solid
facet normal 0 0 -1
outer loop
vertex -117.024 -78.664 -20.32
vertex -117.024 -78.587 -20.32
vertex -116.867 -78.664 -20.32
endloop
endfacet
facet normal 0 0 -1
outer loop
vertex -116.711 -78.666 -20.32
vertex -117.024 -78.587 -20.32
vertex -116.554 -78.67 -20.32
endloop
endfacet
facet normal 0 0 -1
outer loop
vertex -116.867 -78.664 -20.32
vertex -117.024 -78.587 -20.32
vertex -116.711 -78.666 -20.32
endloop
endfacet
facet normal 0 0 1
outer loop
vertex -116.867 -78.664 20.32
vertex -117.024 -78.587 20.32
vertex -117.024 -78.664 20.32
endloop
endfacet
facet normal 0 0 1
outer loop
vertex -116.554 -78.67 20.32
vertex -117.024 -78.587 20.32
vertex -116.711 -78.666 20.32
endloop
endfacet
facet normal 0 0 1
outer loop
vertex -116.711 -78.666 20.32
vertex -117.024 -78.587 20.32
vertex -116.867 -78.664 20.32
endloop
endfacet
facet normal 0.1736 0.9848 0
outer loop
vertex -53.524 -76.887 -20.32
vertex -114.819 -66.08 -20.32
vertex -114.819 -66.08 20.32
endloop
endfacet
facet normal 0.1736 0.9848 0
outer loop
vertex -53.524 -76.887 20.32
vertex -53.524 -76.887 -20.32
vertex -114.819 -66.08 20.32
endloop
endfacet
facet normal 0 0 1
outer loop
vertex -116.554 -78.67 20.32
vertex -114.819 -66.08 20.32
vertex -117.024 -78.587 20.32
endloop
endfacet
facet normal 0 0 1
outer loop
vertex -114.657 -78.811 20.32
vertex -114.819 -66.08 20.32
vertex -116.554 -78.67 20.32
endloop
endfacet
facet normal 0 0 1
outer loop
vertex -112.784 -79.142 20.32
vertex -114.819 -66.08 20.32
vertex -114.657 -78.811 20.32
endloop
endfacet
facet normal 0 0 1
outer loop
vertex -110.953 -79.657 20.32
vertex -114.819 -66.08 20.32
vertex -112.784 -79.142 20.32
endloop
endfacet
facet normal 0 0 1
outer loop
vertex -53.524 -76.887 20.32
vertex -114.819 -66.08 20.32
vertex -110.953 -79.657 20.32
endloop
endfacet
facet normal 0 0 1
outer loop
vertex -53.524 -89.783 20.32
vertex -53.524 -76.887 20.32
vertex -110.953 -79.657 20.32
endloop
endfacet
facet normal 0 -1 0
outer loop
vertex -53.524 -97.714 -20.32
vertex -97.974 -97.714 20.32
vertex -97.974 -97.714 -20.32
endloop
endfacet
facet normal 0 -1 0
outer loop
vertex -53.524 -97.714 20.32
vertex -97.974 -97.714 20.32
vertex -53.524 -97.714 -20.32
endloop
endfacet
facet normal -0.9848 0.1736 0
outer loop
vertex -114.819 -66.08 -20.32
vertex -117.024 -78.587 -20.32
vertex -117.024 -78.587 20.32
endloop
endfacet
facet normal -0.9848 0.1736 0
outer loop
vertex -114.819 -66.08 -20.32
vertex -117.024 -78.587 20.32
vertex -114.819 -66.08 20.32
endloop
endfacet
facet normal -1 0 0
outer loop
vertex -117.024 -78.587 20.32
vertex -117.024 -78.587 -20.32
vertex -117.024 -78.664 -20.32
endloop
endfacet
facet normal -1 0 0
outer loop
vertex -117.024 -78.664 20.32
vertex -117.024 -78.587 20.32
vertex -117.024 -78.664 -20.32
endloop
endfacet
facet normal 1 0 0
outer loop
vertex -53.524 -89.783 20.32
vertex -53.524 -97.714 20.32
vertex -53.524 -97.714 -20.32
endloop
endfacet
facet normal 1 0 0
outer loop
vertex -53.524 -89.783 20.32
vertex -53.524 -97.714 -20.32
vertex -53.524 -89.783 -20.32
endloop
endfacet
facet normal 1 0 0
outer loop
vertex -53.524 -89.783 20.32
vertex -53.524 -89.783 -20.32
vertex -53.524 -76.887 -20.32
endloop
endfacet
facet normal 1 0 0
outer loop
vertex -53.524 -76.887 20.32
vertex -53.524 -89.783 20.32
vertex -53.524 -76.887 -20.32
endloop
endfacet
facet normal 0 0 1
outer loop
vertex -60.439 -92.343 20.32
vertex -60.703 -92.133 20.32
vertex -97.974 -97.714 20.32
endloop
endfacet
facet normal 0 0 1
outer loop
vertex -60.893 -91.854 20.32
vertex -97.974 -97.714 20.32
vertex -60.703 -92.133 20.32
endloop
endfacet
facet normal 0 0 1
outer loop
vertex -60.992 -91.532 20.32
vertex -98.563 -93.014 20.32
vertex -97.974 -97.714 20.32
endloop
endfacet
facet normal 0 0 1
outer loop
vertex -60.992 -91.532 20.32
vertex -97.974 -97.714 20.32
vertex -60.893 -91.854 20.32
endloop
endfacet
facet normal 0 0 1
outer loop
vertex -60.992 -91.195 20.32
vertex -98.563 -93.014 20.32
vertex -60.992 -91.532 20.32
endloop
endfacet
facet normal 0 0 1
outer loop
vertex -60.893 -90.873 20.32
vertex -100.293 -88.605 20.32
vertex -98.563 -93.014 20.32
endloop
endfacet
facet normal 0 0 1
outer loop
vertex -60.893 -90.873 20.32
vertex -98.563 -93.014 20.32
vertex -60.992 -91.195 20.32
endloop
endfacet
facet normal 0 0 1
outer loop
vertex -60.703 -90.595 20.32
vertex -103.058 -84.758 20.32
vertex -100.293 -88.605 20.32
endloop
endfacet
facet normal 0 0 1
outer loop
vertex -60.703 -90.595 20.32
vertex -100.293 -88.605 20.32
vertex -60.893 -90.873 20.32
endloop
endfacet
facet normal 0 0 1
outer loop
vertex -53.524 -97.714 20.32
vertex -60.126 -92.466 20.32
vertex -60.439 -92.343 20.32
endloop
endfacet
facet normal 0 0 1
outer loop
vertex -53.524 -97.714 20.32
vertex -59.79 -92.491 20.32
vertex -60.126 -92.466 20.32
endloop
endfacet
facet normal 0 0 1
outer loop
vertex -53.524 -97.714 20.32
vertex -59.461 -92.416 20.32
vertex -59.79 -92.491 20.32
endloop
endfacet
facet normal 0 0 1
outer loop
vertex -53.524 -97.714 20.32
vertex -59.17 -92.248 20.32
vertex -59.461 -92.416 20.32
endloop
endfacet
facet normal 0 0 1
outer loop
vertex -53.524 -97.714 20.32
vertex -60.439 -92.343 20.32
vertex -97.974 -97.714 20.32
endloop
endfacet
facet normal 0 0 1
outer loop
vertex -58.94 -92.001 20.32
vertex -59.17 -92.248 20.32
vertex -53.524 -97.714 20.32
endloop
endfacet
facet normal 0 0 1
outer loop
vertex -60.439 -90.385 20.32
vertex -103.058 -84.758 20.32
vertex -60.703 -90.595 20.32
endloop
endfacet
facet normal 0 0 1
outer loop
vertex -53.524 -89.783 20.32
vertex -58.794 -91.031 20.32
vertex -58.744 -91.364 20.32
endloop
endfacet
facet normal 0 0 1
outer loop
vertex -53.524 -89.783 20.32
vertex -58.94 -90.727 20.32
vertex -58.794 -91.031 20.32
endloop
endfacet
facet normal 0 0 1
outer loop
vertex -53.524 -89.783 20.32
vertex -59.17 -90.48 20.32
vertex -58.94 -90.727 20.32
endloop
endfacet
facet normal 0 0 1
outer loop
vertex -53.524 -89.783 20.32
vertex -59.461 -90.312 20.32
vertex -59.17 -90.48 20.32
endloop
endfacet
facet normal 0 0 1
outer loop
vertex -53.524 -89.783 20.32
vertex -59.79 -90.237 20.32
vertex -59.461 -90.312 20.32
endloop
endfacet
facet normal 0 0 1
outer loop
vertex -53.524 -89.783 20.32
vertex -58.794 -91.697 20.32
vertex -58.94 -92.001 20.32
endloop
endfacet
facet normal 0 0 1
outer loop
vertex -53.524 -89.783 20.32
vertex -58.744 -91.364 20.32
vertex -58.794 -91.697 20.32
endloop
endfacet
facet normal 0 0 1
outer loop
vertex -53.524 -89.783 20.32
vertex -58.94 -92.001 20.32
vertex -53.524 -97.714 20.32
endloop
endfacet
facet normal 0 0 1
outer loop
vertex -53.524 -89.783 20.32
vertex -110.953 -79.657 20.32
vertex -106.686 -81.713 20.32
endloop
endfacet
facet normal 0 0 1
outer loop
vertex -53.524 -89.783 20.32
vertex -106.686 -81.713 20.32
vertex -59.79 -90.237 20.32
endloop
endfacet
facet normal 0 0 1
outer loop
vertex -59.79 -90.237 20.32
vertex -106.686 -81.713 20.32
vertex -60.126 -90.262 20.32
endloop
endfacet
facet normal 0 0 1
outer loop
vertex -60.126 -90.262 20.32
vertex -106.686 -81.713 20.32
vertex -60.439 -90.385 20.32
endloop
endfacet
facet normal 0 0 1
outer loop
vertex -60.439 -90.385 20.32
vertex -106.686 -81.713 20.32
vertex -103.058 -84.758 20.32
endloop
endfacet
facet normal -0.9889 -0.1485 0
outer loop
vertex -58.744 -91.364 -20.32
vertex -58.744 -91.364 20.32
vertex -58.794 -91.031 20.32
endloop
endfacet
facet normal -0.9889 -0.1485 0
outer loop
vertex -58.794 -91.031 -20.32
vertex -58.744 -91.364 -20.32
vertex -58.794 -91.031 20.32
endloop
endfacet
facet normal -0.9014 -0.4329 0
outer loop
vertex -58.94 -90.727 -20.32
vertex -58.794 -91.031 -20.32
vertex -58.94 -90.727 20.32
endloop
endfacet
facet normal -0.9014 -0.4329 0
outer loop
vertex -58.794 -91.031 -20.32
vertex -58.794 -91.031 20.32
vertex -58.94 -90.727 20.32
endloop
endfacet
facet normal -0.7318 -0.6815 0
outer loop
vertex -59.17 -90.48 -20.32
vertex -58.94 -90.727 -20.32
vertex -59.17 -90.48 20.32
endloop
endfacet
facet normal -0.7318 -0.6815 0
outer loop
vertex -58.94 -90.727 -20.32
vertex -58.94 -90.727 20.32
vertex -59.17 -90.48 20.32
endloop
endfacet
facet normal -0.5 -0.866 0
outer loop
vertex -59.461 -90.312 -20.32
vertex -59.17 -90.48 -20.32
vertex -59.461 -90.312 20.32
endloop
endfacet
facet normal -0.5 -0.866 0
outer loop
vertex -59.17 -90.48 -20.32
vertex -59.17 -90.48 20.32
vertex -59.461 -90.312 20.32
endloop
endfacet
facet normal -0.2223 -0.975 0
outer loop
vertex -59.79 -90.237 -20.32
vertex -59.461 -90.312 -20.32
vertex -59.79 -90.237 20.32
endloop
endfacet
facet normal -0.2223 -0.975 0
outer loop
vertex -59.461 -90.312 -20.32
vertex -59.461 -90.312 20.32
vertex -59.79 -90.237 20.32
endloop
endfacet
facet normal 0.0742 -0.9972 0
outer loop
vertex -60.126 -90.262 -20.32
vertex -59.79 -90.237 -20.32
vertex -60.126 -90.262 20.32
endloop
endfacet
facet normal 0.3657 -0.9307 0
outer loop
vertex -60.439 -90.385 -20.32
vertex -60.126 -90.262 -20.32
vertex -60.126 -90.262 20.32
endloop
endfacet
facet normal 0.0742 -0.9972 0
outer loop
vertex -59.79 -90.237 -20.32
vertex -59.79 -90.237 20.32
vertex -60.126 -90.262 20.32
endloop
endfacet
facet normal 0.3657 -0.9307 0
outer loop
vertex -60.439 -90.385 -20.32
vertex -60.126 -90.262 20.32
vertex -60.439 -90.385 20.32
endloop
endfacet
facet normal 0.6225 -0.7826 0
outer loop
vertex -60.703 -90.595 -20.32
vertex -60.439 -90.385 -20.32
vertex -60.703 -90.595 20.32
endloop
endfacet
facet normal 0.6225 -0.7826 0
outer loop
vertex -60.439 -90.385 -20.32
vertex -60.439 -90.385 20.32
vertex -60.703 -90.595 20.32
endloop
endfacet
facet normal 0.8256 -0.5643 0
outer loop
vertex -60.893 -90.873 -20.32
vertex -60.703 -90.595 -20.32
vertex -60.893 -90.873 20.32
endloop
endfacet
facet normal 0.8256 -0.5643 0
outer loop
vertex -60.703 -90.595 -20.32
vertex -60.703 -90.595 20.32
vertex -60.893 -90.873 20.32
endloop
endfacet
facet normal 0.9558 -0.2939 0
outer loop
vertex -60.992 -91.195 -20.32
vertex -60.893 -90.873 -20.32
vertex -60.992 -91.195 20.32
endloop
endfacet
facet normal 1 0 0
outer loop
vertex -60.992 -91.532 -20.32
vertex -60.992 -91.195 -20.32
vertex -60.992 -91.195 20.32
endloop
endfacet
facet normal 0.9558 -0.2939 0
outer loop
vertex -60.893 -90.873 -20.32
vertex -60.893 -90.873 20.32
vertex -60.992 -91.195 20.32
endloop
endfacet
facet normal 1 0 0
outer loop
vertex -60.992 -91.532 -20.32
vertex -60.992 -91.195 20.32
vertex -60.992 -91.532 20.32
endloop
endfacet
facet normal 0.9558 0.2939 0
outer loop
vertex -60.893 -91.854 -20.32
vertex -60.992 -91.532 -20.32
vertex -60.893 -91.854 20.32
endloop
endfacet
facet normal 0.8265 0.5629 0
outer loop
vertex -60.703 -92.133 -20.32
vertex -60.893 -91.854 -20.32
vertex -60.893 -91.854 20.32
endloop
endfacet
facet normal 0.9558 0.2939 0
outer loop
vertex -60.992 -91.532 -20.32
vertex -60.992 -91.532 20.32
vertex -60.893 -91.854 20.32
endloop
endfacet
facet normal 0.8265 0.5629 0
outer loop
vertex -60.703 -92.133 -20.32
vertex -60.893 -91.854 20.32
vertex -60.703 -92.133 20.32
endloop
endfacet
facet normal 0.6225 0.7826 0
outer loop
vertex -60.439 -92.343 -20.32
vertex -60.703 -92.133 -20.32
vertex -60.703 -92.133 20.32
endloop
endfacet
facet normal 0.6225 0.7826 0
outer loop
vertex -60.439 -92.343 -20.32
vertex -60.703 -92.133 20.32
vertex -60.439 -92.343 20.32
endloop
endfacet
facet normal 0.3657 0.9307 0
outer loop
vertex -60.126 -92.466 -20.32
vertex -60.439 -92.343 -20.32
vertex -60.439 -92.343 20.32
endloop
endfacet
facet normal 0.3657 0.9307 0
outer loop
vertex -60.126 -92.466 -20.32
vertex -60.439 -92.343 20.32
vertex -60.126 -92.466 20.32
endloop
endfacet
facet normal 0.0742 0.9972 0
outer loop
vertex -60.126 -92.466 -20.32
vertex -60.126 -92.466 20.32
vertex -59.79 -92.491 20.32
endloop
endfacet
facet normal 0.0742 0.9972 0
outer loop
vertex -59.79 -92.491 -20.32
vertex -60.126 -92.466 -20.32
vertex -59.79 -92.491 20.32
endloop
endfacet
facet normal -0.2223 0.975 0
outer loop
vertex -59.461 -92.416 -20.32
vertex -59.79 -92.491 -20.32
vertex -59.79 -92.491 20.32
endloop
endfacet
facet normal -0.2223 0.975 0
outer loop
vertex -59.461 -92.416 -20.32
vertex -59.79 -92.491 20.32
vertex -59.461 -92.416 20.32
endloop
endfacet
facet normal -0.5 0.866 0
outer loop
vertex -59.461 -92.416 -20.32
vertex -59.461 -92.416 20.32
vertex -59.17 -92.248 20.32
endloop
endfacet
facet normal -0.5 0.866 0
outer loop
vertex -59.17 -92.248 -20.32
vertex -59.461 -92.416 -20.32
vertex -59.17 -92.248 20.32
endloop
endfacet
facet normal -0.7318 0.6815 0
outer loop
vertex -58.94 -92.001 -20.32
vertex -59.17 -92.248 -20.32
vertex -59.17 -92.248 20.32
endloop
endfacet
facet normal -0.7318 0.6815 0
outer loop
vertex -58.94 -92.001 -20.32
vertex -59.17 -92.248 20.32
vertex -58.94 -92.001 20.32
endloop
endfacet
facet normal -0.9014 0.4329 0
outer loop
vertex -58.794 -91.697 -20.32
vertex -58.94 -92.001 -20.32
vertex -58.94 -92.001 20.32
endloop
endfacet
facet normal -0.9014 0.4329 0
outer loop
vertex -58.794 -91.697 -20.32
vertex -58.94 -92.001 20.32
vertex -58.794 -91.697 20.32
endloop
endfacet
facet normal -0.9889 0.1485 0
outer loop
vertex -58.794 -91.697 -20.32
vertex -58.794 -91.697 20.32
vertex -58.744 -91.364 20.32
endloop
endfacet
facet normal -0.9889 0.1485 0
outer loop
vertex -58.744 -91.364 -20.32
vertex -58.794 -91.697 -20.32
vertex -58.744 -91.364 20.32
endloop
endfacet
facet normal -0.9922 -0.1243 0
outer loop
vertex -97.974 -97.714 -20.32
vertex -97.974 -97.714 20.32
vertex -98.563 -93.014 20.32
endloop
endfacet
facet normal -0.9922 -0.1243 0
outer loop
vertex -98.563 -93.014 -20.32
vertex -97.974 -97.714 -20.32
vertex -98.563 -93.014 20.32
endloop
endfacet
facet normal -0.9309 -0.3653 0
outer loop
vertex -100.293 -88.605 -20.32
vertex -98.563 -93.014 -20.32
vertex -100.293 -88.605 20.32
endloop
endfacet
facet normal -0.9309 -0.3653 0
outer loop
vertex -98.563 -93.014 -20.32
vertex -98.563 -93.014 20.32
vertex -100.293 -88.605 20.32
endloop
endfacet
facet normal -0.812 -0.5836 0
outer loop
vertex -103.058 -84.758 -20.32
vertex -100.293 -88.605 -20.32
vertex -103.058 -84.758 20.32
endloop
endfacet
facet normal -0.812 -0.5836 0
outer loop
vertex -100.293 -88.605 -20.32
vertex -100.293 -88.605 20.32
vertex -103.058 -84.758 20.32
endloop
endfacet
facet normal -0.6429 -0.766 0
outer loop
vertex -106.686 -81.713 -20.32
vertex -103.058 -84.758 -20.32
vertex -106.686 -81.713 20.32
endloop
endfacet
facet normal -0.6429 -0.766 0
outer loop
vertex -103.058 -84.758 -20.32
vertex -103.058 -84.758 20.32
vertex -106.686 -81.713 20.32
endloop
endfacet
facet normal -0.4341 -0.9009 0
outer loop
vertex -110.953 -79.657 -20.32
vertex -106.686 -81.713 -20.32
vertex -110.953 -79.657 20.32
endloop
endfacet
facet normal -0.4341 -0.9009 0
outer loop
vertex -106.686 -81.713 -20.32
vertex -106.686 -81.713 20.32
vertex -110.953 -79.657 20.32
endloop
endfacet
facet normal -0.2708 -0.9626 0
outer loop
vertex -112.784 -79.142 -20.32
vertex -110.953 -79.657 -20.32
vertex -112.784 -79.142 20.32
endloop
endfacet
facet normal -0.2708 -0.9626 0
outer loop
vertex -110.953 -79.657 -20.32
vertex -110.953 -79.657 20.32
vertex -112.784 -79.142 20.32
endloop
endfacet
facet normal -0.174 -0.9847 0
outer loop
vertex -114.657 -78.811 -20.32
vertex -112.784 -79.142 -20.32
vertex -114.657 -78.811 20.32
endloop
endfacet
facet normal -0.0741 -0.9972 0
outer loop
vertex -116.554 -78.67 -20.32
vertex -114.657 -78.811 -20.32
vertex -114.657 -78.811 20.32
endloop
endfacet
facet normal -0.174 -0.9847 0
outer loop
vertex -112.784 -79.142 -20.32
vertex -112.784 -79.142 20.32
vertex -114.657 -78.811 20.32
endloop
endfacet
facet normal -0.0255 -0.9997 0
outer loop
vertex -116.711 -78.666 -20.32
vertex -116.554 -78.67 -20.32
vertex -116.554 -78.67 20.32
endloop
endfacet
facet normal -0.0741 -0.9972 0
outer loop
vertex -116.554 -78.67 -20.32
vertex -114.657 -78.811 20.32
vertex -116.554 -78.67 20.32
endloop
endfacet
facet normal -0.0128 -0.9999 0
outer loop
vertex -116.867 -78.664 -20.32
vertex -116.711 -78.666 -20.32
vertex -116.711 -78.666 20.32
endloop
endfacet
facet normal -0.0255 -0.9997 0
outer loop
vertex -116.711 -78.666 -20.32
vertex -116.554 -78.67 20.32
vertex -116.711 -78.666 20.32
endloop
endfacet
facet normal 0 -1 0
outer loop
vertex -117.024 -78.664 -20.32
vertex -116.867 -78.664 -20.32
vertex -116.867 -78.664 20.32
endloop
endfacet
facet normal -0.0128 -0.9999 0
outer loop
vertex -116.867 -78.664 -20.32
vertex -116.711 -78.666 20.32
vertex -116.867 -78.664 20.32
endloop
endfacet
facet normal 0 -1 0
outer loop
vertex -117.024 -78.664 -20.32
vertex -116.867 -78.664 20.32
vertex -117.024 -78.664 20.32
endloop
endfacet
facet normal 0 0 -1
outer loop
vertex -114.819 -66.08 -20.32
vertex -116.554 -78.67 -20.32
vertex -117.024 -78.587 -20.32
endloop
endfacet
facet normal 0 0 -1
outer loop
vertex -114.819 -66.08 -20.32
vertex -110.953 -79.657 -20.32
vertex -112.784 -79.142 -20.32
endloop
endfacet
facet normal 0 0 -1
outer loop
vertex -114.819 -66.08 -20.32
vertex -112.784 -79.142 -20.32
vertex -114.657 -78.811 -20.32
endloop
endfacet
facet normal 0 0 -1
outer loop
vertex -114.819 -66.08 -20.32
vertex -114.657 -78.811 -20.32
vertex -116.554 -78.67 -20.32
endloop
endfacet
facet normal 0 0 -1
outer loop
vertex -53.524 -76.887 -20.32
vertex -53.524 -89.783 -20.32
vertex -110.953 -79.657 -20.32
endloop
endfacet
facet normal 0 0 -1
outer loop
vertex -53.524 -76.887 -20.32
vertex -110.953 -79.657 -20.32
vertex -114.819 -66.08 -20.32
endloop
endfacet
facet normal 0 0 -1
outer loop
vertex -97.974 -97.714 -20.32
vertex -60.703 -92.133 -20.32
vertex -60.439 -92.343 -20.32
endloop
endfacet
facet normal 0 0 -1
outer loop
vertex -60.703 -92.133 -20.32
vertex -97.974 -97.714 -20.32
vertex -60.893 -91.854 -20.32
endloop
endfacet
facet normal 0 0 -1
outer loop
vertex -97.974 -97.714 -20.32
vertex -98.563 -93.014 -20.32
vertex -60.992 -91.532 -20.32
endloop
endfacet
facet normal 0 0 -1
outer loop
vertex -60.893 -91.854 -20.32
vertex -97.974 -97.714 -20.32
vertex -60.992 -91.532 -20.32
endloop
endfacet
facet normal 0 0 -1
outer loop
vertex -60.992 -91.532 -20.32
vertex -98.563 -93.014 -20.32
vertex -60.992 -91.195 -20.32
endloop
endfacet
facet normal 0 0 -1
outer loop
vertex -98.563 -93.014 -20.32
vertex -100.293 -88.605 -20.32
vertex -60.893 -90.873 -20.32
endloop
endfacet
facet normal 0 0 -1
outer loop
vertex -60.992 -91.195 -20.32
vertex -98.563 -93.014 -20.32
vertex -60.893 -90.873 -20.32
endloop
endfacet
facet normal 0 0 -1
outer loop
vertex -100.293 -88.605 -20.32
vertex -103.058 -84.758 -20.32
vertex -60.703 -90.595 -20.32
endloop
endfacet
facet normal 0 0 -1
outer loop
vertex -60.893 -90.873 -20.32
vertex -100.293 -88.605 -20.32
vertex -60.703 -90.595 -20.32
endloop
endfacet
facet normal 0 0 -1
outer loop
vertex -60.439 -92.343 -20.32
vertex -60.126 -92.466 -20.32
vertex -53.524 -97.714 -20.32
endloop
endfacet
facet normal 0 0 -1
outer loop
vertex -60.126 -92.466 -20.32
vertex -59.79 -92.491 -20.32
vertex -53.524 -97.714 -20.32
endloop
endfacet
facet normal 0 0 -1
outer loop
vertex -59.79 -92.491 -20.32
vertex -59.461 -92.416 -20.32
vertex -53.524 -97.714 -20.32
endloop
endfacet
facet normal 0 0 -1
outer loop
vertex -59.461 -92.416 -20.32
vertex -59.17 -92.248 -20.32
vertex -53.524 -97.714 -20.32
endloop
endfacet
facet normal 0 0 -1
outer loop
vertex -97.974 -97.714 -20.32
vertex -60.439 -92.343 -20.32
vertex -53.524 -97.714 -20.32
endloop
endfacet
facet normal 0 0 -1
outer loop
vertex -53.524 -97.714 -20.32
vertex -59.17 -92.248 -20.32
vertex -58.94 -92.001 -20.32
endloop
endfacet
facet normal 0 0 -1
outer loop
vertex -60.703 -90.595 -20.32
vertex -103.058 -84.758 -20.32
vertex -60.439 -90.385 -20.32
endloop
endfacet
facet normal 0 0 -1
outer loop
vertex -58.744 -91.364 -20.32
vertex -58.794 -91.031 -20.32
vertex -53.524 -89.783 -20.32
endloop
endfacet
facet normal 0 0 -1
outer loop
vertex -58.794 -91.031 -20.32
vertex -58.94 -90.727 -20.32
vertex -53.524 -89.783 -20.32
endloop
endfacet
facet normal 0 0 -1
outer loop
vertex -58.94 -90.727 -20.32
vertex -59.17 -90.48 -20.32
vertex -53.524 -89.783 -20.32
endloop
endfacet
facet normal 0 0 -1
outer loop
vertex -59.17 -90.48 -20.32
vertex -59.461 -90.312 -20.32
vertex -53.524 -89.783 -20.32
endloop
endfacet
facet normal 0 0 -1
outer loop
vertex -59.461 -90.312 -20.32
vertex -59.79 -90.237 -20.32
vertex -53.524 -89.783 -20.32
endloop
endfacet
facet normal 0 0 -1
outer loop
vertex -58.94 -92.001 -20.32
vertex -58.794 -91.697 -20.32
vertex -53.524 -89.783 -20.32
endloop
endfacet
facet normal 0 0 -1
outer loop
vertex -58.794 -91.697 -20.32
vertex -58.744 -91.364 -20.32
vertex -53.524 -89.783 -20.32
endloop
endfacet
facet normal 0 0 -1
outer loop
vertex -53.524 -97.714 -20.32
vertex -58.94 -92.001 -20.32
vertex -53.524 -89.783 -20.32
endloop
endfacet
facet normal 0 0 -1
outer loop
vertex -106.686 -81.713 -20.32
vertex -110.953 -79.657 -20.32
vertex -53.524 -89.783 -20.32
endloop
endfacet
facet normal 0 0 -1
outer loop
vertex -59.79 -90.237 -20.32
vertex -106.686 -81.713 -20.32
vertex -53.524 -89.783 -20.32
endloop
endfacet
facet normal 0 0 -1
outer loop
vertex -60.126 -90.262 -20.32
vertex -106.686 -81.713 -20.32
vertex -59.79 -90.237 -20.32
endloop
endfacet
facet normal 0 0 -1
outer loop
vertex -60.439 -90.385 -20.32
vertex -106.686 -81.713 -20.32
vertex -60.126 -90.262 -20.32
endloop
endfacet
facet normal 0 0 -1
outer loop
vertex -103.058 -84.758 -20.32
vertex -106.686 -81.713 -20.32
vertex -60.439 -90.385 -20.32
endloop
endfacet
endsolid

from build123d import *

# Parameters (mm, degrees)
BOSS_EXTRUDE1_DEPTH = 40.64
SKETCH6_R           = 1.1303
CUT_EXTRUDE1_DEPTH  = 158.779215984
SKETCH7_W           = 195.523307817
SKETCH7_H           = 195.523307817
CUT_EXTRUDE2_DEPTH  = 158.779215984
SKETCH8_R           = 1.1303
CUT_EXTRUDE3_DEPTH  = 158.779215984
SKETCH9_R           = 19.05
CUT_EXTRUDE4_DEPTH  = 158.779215984


with BuildPart() as part:
    # Sweep3: sweep along a path in Sketch2
    with BuildLine(Plane.XY) as sweep3_path:
        Line((-111.378641457, -46.568583299), (-11.322173751, -64.21123815))
        ThreePointArc((-11.322173751, -64.21123815), (53.410187761, -37.398216088), (56.466415172, 32.6009))
        Line((56.466415172, 32.6009), (37.416415172, 65.596467884))
    # 3DSketch1 → Sweep3 (sweep)
    with BuildSketch(Plane(origin=(-117.024291009, -78.586652965, -20.32), x_dir=(0.051794909001673446, 0.2937435257699459, 0.9544799780350292), z_dir=(0.984807753012208, -0.17364817766693055, 0))):
        Polygon((0, 0), (3.788092413, -12.121895721), (42.57815872, 0), (38.790066307, 12.121895721), align=None)
    sweep(path=sweep3_path.line)

    # Sketch5 → Boss-Extrude1 (add)
    with BuildSketch(Plane.XY.offset(20.32)):
        with BuildLine():
            Line((-16.967823303, -96.229307816), (-117.024291009, -78.586652965))
            Line((-117.024291009, -78.586652965), (-117.024291009, -97.7138))
            Line((-117.024291009, -97.7138), (3.02e-07, -97.7138))
            ThreePointArc((3.02e-07, -97.7138), (-8.516318665, -97.341969504), (-16.967823303, -96.229307816))
        make_face()
        with BuildLine():
            ThreePointArc((97.7138, -9e-08), (69.09409067, -69.094090521), (3.02e-07, -97.7138))
            Line((3.02e-07, -97.7138), (97.7138, -97.7138))
            Line((97.7138, -97.7138), (97.7138, -9e-08))
        make_face()
        with BuildLine():
            ThreePointArc((84.6226331, 48.8569), (94.384283017, 25.290192366), (97.7138, -9e-08))
            Line((97.7138, -9e-08), (97.7138, 81.852467884))
            Line((97.7138, 81.852467884), (65.5726331, 81.852467884))
            Line((65.5726331, 81.852467884), (84.6226331, 48.8569))
        make_face()
    extrude(amount=-BOSS_EXTRUDE1_DEPTH)

    # Sketch6 → Cut-Extrude1 (cut, through all)
    with BuildSketch(Plane.XY.offset(20.32)):
        with Locations((91.3638, -91.3638)):
            Circle(SKETCH6_R)
        with Locations((-41.9735, -91.3638)):
            Circle(SKETCH6_R)
    extrude(amount=-CUT_EXTRUDE1_DEPTH, mode=Mode.SUBTRACT)

    # Sketch7 → Cut-Extrude2 (cut, through all)
    with BuildSketch(Plane.XY.offset(20.32)):
        with Locations((44.2373629, 0.047853909)):
            Rectangle(SKETCH7_W, SKETCH7_H)
    extrude(amount=-CUT_EXTRUDE2_DEPTH, mode=Mode.SUBTRACT)

    # Sketch8 → Cut-Extrude3 (cut, through all)
    with BuildSketch(Plane.XY.offset(20.32)):
        with Locations((-59.874291009, -91.3638)):
            Circle(SKETCH8_R)
    extrude(amount=-CUT_EXTRUDE3_DEPTH, mode=Mode.SUBTRACT)

    # Sketch9 → Cut-Extrude4 (cut, through all)
    with BuildSketch(Plane.XY.offset(20.32)):
        with Locations((-117.024291009, -97.7138)):
            Circle(SKETCH9_R)
    extrude(amount=-CUT_EXTRUDE4_DEPTH, mode=Mode.SUBTRACT)


solid = part.part
